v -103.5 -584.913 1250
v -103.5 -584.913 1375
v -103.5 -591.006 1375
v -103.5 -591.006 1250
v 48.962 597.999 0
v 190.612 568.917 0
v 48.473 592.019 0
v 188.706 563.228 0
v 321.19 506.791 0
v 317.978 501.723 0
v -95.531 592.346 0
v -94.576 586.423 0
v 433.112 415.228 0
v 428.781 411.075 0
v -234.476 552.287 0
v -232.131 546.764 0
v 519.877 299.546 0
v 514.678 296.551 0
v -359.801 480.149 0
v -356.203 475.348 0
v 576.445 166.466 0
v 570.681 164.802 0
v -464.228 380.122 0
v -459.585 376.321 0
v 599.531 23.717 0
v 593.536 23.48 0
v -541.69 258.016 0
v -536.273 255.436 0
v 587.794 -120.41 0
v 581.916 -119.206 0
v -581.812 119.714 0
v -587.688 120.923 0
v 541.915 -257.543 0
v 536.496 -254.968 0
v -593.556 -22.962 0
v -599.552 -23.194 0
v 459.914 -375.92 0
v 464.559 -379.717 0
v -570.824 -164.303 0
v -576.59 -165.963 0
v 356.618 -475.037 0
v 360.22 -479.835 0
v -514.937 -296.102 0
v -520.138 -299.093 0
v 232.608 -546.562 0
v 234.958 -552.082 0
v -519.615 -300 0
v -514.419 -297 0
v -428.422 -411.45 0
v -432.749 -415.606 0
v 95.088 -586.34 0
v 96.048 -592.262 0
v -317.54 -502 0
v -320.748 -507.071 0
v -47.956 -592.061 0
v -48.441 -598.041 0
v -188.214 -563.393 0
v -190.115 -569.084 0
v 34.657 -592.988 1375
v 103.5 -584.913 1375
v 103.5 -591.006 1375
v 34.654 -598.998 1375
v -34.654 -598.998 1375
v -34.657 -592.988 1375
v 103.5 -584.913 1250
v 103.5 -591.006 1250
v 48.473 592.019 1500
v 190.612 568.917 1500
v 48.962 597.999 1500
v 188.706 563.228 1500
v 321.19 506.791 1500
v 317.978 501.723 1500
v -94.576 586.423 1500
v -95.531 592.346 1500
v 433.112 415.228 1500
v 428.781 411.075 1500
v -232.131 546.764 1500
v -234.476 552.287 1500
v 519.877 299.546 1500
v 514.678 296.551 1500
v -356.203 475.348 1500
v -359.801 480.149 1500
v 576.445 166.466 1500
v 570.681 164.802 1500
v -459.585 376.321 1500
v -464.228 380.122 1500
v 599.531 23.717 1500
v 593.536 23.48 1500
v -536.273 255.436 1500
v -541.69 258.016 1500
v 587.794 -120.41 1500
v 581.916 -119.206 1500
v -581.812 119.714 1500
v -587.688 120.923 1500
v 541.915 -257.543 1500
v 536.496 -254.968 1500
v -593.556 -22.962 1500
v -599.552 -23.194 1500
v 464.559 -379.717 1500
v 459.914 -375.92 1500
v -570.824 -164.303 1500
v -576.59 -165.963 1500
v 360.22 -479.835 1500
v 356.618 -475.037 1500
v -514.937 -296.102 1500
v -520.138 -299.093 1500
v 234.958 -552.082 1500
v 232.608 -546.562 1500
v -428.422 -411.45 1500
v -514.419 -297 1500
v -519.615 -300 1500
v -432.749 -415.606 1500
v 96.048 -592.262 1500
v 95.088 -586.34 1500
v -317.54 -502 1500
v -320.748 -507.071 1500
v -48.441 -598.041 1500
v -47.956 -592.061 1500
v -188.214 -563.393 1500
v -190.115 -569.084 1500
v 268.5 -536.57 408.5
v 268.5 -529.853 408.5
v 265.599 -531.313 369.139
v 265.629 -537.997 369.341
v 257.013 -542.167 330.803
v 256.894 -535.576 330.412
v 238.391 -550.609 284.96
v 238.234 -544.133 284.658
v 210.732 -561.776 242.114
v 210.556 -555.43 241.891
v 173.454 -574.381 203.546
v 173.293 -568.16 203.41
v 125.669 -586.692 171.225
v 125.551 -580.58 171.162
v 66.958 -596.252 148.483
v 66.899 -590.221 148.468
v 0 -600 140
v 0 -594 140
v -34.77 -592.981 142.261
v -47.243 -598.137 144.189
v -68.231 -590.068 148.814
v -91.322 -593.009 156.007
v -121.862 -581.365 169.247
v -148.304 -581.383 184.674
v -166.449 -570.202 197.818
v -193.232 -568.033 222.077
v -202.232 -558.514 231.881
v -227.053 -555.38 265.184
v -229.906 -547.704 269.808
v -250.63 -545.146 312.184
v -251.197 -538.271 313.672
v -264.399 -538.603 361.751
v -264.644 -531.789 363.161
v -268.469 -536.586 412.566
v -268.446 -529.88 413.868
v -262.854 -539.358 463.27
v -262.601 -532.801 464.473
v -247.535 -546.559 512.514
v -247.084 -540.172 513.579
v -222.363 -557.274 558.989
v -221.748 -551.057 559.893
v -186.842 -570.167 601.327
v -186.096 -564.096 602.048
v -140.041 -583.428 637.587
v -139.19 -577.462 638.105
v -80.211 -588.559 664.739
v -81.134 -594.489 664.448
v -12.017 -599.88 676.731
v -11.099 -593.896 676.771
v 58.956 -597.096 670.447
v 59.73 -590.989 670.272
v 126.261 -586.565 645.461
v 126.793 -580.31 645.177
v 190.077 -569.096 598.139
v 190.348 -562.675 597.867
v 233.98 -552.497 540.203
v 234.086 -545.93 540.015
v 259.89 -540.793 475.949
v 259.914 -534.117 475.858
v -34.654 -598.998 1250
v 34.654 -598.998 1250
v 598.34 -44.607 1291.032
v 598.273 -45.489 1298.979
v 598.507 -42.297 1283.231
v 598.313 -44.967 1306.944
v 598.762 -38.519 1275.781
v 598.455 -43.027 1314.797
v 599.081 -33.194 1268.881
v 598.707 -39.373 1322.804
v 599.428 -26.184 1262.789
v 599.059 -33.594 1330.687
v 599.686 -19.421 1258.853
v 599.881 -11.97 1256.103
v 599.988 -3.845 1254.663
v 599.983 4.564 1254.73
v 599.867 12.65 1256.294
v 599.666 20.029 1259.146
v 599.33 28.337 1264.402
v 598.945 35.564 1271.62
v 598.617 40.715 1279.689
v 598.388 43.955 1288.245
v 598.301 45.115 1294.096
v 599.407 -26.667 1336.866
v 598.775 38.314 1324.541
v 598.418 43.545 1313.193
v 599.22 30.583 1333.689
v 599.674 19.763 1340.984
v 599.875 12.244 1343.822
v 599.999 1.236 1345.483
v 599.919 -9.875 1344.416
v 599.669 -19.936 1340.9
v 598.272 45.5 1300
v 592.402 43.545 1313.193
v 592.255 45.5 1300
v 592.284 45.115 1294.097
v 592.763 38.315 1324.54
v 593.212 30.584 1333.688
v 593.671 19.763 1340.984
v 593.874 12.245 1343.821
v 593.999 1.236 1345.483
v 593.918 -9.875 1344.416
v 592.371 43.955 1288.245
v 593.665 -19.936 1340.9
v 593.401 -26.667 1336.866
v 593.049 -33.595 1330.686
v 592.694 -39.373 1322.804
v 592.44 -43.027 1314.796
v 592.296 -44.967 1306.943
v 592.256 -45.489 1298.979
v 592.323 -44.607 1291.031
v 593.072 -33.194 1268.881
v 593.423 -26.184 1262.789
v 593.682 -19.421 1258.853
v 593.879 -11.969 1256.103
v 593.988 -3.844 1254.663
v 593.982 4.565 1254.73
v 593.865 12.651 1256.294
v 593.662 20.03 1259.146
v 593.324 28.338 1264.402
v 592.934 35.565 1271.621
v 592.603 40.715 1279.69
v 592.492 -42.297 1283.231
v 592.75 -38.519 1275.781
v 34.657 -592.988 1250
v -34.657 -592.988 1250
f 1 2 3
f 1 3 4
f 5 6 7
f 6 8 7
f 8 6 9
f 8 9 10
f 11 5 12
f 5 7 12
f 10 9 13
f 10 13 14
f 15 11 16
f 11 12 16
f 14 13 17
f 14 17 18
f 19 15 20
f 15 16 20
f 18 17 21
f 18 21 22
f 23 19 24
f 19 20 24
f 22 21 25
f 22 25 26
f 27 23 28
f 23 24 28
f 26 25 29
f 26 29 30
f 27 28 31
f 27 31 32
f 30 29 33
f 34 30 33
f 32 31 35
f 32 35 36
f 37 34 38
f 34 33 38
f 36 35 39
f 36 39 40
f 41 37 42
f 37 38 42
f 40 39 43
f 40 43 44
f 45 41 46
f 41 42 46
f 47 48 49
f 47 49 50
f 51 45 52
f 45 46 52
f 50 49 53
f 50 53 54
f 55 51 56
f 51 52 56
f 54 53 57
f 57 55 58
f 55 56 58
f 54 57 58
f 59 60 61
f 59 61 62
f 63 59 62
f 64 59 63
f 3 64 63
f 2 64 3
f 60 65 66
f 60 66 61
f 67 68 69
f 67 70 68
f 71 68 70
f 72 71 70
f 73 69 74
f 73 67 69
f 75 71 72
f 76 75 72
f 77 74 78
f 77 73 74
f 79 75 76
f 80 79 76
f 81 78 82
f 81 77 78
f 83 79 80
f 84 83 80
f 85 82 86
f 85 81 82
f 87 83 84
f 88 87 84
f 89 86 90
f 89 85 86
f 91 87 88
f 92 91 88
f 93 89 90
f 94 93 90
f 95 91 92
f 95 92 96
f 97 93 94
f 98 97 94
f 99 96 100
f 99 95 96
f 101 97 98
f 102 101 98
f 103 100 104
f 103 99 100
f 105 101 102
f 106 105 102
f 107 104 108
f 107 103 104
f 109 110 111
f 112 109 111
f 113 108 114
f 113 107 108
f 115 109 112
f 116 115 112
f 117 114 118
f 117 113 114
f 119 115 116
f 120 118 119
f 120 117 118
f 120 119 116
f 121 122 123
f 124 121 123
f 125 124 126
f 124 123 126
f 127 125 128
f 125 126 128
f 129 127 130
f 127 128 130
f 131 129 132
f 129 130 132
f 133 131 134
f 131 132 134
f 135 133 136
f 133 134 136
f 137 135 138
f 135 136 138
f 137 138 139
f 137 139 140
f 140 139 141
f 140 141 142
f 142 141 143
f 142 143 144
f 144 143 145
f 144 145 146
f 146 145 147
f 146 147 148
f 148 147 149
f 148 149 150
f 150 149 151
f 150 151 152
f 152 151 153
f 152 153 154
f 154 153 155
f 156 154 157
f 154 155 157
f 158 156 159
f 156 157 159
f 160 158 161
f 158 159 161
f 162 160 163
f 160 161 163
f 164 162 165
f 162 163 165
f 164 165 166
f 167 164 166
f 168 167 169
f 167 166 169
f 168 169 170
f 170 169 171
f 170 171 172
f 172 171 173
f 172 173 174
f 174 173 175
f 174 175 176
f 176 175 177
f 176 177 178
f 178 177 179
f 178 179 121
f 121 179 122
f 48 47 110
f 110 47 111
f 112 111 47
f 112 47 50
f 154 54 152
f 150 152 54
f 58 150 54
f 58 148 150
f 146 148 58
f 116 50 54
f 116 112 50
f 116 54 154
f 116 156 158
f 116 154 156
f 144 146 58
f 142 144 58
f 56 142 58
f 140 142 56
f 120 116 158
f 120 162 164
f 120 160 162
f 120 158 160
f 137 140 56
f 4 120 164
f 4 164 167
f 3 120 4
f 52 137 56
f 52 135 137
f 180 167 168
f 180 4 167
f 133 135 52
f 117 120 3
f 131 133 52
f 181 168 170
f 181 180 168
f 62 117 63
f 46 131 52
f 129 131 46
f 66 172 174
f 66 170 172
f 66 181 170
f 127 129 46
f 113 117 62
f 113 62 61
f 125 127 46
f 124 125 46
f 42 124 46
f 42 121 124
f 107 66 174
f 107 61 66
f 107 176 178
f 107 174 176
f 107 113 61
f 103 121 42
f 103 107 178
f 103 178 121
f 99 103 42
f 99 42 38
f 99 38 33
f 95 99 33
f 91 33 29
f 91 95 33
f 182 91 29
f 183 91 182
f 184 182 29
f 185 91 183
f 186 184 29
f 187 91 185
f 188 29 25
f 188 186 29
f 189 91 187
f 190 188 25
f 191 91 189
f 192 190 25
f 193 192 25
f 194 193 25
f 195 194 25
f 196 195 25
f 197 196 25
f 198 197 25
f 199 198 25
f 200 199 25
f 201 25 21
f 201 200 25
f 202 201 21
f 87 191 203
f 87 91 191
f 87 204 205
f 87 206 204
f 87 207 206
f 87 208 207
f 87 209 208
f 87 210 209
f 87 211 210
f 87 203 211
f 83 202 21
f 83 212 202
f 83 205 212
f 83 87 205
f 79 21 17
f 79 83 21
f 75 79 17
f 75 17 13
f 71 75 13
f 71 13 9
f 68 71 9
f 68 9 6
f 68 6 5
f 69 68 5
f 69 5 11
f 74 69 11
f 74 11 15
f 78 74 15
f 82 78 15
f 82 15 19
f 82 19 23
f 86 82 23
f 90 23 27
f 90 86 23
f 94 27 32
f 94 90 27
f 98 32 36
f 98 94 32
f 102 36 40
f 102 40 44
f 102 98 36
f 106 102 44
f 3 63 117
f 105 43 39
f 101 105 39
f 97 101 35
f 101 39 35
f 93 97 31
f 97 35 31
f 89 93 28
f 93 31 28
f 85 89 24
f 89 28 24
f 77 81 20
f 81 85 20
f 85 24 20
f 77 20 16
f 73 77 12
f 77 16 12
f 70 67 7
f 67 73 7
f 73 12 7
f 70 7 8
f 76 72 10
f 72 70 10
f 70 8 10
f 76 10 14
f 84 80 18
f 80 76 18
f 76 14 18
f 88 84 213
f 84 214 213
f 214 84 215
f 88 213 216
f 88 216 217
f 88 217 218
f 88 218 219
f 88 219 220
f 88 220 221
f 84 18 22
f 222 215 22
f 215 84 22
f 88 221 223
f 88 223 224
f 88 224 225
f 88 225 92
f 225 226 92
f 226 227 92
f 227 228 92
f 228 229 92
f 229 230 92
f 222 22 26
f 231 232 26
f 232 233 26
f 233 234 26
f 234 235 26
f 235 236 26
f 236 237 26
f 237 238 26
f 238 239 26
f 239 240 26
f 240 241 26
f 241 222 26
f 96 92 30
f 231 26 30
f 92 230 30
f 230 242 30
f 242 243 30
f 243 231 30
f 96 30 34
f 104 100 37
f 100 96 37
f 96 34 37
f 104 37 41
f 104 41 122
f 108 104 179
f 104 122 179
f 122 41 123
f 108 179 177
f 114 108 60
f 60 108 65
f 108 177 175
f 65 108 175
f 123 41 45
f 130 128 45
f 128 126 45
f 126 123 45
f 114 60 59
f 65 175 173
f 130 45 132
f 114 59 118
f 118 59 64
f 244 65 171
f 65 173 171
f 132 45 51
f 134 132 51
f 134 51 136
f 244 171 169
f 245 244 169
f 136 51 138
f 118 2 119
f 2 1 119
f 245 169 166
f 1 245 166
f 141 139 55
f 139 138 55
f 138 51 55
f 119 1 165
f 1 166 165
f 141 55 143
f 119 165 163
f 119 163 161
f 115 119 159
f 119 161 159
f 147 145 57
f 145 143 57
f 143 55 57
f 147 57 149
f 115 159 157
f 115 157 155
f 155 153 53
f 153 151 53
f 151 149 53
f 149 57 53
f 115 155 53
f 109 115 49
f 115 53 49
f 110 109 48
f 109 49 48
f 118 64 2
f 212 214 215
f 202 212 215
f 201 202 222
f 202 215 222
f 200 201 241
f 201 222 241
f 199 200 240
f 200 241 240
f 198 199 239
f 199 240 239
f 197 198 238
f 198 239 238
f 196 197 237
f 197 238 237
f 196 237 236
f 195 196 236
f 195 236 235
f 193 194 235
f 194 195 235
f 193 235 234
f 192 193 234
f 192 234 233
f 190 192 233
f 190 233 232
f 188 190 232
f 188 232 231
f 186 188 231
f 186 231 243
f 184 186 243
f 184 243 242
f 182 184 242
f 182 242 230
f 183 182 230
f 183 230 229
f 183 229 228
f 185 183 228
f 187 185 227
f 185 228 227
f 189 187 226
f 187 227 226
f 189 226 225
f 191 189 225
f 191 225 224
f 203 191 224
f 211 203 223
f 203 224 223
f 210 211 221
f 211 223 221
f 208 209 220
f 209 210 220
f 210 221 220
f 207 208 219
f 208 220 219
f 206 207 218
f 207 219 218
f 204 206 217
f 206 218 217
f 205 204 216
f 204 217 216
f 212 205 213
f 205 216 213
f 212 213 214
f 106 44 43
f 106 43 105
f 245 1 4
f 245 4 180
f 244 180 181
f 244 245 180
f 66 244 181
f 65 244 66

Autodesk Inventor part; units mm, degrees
sketch "Sketch13" plane through (0, 0, 0) normal (0, 0, 1) x (1, 0, 0)
  circle A0 centre (0, 0) radius 600 construction
  line L0 (0, 0) -> (0, -600)
  line L1 (0, 0) -> (-519.6152, -300)
  line L2 (0, 0) -> (600, 0)
  line L3 (0, 0) -> (0, -600)
  line L4 (0, 0) -> (0, -600)
  line L5 (0, 0) -> (534.6039, 272.3943)
  line L6 (0, 0) -> (0, 600)
  dimension "d53" = 1200
  dimension "d55" = 0
  dimension "d98" = 180
  dimension "d99" = 240
  dimension "d100" = 63
  dimension "d101" = 90
ref_plane "WeldJoint" through (0, 0, -10) normal (0.5, -0.866, 0) x (0, 0, 1)
ref_plane "Inlet_Clock_Angle_plane" through (0, 0, -10) normal (0, 1, 0) x (0, 0, 1)
ref_plane "Charging" through (0, 0, -10) normal (1, 0, 0) x (0, 0, 1)
ref_plane "Accsess" through (0, 0, -10) normal (1, 0, 0) x (0, 0, 1)
sketch "Sketch14" plane through (0, 0, -10) normal (0.5, -0.866, 0) x (0, 0, 1)
  line L0 (1510, 594) -> (10, 594)
  line L1 (10, 594) -> (10, 600)
  line L2 (10, 600) -> (1510, 600)
  line L3 (1510, 600) -> (1510, 594)
  line L4 (10, 0) -> (1510, 0)
  line L5 (10, 600) -> (-20, 600) construction
  line L6 (10, 594) -> (-20, 594) construction
  arc A0 (-20, 594) -> (-109.2789, 539.0476) centre (-20, 494) ccw construction
  arc A1 (-109.2789, 539.0476) -> (-234, 15) centre (929.3202, 15) ccw construction
  line L7 (-234, 15) -> (-234, 0) construction
  line L8 (10, 0) -> (-234, 0) construction
  arc A2 (-20, 600) -> (-114.6356, 541.7504) centre (-20, 494) ccw construction
  arc A3 (-114.6356, 541.7504) -> (-240, 15) centre (929.3202, 15) ccw construction
  line L9 (-240, 15) -> (-240, 0) construction
  line L10 (-234, 0) -> (-240, 0) construction
  line L11 (1510, 594) -> (1540, 594)
  line L12 (1510, 600) -> (1540, 600)
  line L13 (1510, 0) -> (1754, 0) construction
  line L14 (1760, 0) -> (1760, 15) construction
  arc A4 (1760, 15) -> (1634.6356, 541.7504) centre (590.6798, 15) ccw construction
  arc A5 (1634.6356, 541.7504) -> (1540, 600) centre (1540, 494) ccw construction
  line L15 (1754, 0) -> (1754, 15) construction
  line L16 (1754, 0) -> (1760, 0) construction
  arc A6 (1754, 15) -> (1629.2789, 539.0476) centre (590.6798, 15) ccw construction
  arc A7 (1629.2789, 539.0476) -> (1540, 594) centre (1540, 494) ccw construction
  line L17 (-156.8588, 530) -> (-610, 530)
  line L18 (-610, 530) -> (-610, 450)
  line L19 (-610, 450) -> (-156.8588, 450)
  line L20 (-156.8588, 450) -> (-156.8588, 530)
  line L21 (1760, 15) -> (1790, 15) construction
  line L22 (1790, 15) -> (1790, 0) construction
  line L23 (1790, 0) -> (1760, 0) construction
  line L24 (-610, 610) -> (-610, 530)
  line L25 (-610, 610) -> (-604, 610)
  line L26 (-604, 610) -> (-604, 530)
  line L27 (-115.4356, 543.7196) -> (-164.9441, 431.7071)
  line L28 (-156.8588, 530) -> (-121.4996, 530)
  line L29 (-109.2789, 539.0476) -> (-114.6356, 541.7504)
  line L30 (-115.4356, 543.7196) -> (-116.0014, 542.4396) construction
  line L31 (-116.0014, 542.4396) -> (-114.6356, 541.7504) construction
  point P0 (10, 597)
  point P1 (-140.1899, 487.7134)
  dimension "d59" = 1500
  dimension "d60" = 6
  dimension "d61" = 1200
  dimension "d82" = 100
  dimension "d83" = 30
  dimension "d86" = 80
  dimension "d87" = 30
  dimension "d88" = 2400
  dimension "d90" = 900
  dimension "d91" = 15
  dimension "d92" = 20
  dimension "d93" = 250
  dimension "d94" = 30
revolve "Revolution2" add sketch "Sketch14" angle 359.9 about axis through (0, 0, 0) along (0, 0, 1) contours L0 L1 L2 L3
sketch "Sketch AnglePlane_InletPipe" plane through (0, 0, -10) normal (0, 1, 0) x (0, 0, 1)
  line L0 (10, -600) -> (10, 600) projected
  line L1 (10, 0) -> (1310, 0)
  line L2 (1310, 0) -> (1310, 600)
  line L3 (1310, 600) -> (10, 600)
  line L4 (10, 600) -> (10, 0)
  point P0 (10, -519.6152)
  point P1 (10, -520.138)
  dimension "d63" = 1200
  dimension "d64" = 90
  dimension "frd_hght" = 1300
ref_plane "InletPipe_AnglePlane" through (0, 0, 1300) normal (1, 0, 0) x (0, 1, 0)
sketch "Sketch16" plane through (0, 0, 1300) normal (1, 0, 0) x (0, 1, 0)
  circle A0 centre (0, 0) radius 45.5
  point P0 (0, -1300)
  point P1 (0, 0)
  point P2 (0, 0)
  point P3 (0, 0)
  dimension "d66" = 91
extrude "Extrusion7" cut sketch "Sketch16" along normal through all
ref_plane "Work Plane16" through (0, 0, 0) normal (0, -1, 0) x (1, 0, 0)
sketch "Sketch17" plane through (0, 0, 0) normal (0, -1, 0) x (1, 0, 0)
  circle A0 centre (0, 408.5) radius 268.5
  line L0 (0, 140) -> (-495.5727, 140)
  point P0 (0, 0)
  dimension "d69" = 537
  dimension "d71" = 140
extrude "Extrusion8" cut sketch "Sketch17" along normal through all
sketch "Sketch19" plane through (0, 0, -10) normal (1, 0, 0) x (0, 0, 1)
  line L0 (10, 0) -> (1260, 0)
  line L1 (1260, 0) -> (1260, 600)
  line L2 (1260, 600) -> (10, 600)
  line L3 (10, 600) -> (10, 0)
  dimension "d74" = 1250
  dimension "d76" = 1200
  dimension "d77" = 90
ref_plane "Work Plane18" through (0, 0, 1250) normal (0, -1, 0) x (1, 0, 0)
sketch "Sketch20" plane through (0, 0, 1250) normal (0, -1, 0) x (1, 0, 0)
  line L0 (-103.5, 0) -> (103.5, 0)
  line L1 (103.5, 0) -> (103.5, 125)
  line L2 (103.5, 125) -> (-103.5, 125)
  line L3 (-103.5, 125) -> (-103.5, 0)
  point P0 (0, -1250)
  point P1 (0, 0)
  point P2 (0, 0)
  point P3 (0, 0)
  point P4 (0, 0)
  dimension "d78" = 207
  dimension "d79" = 125
extrude "Extrusion9" cut sketch "Sketch20" along normal through all
equation "\"BendRadius\" = Thickness"
equation "\"BendReliefWidth\" = Thickness"
equation "\"BendReliefDepth\" = 0.5 * Thickness"
equation "\"CornerReliefSize\" = 4 * Thickness"
equation "\"MinimumRemnant\" = 2 * Thickness"
equation "\"TransitionRadius\" = BendRadius"
equation "\"JacobiRadiusSize\" = BendRadius"
equation "\"GapSize\" = Thickness"
equation "\"InletPipe_horisont_angle\" = 0"
equation "\"AccsessHatch_diameter\" = 535"
equation "\"AccsessHatch_ClockAngle\" = 0"
equation "\"ChargingHatch_ClockAgnle\" = 180deg"
equation "\"InletPipe_Clock_angle\" = 90deg"
equation "\"OutletPipe_ClockAngle\" = 63deg"
equation "\"WeldJoint_ClockAgnle\" = 240deg"
equation "\"Thickness\" = 6"
properties part number "PRS 000 Filter1200 MAIN Shell" material "Steel"
